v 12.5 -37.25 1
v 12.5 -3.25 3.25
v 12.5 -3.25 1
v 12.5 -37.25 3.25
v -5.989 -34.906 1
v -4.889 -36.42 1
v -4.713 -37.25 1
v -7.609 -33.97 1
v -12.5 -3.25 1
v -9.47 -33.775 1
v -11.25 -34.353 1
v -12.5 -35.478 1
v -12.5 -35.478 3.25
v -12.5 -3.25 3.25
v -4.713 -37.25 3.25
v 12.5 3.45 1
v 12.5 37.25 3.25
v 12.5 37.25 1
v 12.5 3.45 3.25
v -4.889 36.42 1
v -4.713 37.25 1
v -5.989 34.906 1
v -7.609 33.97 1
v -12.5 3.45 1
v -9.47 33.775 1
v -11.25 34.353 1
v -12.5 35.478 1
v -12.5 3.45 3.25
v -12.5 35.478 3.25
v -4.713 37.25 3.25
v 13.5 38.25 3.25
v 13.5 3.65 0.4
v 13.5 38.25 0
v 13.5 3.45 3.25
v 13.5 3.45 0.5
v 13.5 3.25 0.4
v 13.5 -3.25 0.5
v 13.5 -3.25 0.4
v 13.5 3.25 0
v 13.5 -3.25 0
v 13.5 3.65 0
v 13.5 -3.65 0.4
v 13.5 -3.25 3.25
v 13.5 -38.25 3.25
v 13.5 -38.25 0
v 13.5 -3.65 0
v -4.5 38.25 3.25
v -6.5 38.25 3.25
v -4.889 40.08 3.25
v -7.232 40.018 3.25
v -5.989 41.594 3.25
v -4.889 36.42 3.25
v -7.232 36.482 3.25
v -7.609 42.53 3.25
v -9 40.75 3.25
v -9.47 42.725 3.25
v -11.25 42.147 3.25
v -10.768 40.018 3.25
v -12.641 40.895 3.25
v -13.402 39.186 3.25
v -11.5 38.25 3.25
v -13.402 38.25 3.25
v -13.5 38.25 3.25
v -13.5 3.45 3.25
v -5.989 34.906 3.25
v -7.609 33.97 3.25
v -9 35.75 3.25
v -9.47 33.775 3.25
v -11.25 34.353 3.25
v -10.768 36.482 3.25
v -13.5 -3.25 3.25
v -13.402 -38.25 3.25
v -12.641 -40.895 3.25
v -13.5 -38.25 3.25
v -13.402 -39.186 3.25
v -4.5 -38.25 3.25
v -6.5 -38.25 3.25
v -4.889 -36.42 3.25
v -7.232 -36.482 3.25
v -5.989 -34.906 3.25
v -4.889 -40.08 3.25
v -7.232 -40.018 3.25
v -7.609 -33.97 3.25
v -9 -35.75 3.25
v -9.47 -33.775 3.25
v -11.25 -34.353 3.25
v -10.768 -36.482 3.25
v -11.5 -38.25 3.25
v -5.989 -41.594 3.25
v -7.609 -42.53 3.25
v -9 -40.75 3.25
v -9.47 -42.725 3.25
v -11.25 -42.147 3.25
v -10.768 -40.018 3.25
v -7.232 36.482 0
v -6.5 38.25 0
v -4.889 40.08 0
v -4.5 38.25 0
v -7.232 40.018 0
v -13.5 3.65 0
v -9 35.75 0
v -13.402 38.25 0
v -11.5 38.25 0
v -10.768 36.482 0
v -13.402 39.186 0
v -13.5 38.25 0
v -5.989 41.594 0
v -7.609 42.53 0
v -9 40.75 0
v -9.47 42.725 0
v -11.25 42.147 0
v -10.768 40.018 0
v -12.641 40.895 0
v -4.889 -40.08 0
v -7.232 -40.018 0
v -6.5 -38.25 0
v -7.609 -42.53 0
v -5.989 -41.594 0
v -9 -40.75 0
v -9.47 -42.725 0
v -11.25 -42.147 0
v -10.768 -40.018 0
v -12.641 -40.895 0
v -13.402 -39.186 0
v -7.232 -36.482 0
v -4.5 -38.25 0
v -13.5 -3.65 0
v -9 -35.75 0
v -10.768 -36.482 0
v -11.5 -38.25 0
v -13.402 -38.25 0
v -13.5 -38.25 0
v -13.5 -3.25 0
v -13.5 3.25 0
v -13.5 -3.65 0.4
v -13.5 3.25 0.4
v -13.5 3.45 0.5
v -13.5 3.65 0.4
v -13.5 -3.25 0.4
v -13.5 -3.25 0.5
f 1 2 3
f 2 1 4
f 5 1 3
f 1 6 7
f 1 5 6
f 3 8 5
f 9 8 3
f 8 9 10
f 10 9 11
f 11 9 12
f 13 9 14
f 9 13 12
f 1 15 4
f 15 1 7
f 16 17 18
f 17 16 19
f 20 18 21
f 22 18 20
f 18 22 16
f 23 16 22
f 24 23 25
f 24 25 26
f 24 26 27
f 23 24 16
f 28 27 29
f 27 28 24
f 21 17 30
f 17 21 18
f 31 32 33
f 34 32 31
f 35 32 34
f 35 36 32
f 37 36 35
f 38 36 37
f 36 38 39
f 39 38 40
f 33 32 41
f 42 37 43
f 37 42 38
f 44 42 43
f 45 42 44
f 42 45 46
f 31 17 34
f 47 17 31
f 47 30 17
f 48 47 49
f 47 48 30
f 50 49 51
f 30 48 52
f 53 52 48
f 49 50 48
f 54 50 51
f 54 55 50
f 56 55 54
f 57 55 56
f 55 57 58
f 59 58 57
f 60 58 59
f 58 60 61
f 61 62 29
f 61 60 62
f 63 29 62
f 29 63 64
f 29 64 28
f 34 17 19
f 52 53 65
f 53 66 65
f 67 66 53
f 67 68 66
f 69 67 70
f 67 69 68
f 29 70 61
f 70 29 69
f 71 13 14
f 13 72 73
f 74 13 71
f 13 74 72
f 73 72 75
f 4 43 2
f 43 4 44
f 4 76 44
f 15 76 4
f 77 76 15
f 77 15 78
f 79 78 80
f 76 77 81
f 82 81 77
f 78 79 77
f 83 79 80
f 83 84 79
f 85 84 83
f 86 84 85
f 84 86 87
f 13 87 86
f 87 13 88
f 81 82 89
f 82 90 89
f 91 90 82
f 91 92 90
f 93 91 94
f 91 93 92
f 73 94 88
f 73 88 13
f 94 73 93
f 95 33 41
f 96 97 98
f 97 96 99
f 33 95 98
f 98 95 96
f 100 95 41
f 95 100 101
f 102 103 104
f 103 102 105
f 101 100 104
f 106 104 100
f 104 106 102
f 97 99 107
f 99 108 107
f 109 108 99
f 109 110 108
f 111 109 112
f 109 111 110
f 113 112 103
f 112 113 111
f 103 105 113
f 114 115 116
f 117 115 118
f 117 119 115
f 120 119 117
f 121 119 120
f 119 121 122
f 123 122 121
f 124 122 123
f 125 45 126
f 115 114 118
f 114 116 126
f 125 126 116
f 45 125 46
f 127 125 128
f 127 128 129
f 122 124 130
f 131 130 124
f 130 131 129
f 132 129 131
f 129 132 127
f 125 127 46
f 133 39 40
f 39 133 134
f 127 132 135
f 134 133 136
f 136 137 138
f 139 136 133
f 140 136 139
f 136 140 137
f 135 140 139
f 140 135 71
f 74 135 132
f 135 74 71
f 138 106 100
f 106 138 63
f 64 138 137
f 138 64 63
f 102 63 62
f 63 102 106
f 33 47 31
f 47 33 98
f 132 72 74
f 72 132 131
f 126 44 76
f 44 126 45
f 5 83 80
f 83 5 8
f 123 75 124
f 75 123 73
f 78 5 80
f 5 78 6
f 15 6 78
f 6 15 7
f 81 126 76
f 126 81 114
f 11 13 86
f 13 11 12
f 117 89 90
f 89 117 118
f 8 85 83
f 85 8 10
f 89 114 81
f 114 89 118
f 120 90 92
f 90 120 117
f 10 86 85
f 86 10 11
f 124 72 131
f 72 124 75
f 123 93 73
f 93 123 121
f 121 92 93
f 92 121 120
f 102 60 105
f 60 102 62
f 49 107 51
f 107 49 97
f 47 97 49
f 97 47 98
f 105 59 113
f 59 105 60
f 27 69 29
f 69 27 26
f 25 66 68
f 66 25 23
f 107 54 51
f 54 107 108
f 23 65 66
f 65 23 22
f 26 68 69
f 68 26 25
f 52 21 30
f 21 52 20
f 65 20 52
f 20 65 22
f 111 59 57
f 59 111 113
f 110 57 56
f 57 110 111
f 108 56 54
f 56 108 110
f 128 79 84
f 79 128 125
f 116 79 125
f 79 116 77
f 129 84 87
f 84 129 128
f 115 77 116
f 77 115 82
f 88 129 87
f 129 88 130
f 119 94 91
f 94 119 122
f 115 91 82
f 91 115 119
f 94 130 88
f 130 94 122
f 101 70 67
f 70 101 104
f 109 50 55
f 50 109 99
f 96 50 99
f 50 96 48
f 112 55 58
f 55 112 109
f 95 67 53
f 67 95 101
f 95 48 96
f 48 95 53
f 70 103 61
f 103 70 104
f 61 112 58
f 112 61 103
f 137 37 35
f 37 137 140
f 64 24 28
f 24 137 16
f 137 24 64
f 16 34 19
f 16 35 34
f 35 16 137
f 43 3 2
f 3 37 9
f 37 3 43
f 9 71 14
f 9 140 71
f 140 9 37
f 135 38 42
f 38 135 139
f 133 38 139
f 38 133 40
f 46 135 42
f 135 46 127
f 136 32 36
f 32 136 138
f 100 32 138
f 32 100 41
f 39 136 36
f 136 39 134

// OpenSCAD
// [FL_INDEX: keywords="openscad, 3d_parametric, SD_Key_Chain, csg_solid" | COT="Parametric OpenSCAD design from 3DCodeverse"]
// Title: SD Key Chain

/* [Cards] */
// The number of SD cards you want to fit inside
number_of_cards = 2; // [1,2,3]

// The width of the SD card (mm)
card_width = 25; // [10:50]
// The height of the SD card (mm)
card_height = 34; // [10:50]
// The depth of the SD card (mm)
card_depth = 2.25; 

// The thickness you want the edges of the container to be (mm)
edge_thickness = 1; // [1,2]

/* [Hinge] */
// The thickness you want the hinge to be (mm)
hinge_thickness = 0.5; // 
// The dimensions of the gap used to help the 90 degree bends (mm)
hinge_bend_gap = 0.4; // 

/* [Loop] */
// The inner radius of the loop's hole (mm)
loop_hole_radius = 2.5; 
// The outer radius of the loop (mm)
loop_outer_radius = 4.5; 
// The location of the loop hole (mm)
loop_hole_location = 4.5;

fudge = 0.2;
halffudge = fudge / 2;

    container_depth = card_depth * number_of_cards;
    halfcontainer_depth = container_depth / 2;

    model_height = card_width + edge_thickness * 2;
    model_depth = halfcontainer_depth + edge_thickness;

    hole_depth = model_depth;

    // not including loop
    modelwidth = (card_height + edge_thickness + model_depth) * 2;

    // center x and y on axes
    translate([-model_height/2, -modelwidth/2, 0])
    difference() {
        union() {
            difference() {
                union() {
                    // main body
                    cube([model_height, modelwidth, model_depth], center = false);
                }
                union() {
                    // remove space for cards
                    translate([edge_thickness, edge_thickness, edge_thickness]) 
                    cube([card_width, card_height + fudge, halfcontainer_depth + fudge]);
                    translate([edge_thickness, card_height + edge_thickness + model_depth * 2, edge_thickness]) 
                    cube([card_width, card_height, halfcontainer_depth + fudge]);
                }
            }
            union() {
                // loop for keychain
                translate([loop_hole_location, 0, 0]) 
                cylinder(h = hole_depth, r = loop_outer_radius);    
                translate([loop_hole_location, modelwidth, 0]) 
                cylinder(h = hole_depth, r = loop_outer_radius);    
            }
        }
        union() {
            // hole in loop
            translate([loop_hole_location, 0, -halffudge]) 
            cylinder(h = hole_depth + fudge, r = loop_hole_radius);    
            translate([loop_hole_location, modelwidth, -halffudge]) 
            cylinder(h = hole_depth + fudge, r = loop_hole_radius);    

            // hinge area
            translate([-halffudge, card_height + edge_thickness, .5]) 
            cube([model_height + fudge, model_depth * 2 + fudge, model_depth - hinge_thickness + fudge]);

            // gap for bending
            translate([0, card_height + edge_thickness - hinge_bend_gap, 0]) 
            cube([model_height, hinge_bend_gap, hinge_bend_gap], center = false);
            translate([0, card_height + edge_thickness + model_depth * 2, 0]) 
            cube([model_height, hinge_bend_gap, hinge_bend_gap], center = false);
        }
    }
